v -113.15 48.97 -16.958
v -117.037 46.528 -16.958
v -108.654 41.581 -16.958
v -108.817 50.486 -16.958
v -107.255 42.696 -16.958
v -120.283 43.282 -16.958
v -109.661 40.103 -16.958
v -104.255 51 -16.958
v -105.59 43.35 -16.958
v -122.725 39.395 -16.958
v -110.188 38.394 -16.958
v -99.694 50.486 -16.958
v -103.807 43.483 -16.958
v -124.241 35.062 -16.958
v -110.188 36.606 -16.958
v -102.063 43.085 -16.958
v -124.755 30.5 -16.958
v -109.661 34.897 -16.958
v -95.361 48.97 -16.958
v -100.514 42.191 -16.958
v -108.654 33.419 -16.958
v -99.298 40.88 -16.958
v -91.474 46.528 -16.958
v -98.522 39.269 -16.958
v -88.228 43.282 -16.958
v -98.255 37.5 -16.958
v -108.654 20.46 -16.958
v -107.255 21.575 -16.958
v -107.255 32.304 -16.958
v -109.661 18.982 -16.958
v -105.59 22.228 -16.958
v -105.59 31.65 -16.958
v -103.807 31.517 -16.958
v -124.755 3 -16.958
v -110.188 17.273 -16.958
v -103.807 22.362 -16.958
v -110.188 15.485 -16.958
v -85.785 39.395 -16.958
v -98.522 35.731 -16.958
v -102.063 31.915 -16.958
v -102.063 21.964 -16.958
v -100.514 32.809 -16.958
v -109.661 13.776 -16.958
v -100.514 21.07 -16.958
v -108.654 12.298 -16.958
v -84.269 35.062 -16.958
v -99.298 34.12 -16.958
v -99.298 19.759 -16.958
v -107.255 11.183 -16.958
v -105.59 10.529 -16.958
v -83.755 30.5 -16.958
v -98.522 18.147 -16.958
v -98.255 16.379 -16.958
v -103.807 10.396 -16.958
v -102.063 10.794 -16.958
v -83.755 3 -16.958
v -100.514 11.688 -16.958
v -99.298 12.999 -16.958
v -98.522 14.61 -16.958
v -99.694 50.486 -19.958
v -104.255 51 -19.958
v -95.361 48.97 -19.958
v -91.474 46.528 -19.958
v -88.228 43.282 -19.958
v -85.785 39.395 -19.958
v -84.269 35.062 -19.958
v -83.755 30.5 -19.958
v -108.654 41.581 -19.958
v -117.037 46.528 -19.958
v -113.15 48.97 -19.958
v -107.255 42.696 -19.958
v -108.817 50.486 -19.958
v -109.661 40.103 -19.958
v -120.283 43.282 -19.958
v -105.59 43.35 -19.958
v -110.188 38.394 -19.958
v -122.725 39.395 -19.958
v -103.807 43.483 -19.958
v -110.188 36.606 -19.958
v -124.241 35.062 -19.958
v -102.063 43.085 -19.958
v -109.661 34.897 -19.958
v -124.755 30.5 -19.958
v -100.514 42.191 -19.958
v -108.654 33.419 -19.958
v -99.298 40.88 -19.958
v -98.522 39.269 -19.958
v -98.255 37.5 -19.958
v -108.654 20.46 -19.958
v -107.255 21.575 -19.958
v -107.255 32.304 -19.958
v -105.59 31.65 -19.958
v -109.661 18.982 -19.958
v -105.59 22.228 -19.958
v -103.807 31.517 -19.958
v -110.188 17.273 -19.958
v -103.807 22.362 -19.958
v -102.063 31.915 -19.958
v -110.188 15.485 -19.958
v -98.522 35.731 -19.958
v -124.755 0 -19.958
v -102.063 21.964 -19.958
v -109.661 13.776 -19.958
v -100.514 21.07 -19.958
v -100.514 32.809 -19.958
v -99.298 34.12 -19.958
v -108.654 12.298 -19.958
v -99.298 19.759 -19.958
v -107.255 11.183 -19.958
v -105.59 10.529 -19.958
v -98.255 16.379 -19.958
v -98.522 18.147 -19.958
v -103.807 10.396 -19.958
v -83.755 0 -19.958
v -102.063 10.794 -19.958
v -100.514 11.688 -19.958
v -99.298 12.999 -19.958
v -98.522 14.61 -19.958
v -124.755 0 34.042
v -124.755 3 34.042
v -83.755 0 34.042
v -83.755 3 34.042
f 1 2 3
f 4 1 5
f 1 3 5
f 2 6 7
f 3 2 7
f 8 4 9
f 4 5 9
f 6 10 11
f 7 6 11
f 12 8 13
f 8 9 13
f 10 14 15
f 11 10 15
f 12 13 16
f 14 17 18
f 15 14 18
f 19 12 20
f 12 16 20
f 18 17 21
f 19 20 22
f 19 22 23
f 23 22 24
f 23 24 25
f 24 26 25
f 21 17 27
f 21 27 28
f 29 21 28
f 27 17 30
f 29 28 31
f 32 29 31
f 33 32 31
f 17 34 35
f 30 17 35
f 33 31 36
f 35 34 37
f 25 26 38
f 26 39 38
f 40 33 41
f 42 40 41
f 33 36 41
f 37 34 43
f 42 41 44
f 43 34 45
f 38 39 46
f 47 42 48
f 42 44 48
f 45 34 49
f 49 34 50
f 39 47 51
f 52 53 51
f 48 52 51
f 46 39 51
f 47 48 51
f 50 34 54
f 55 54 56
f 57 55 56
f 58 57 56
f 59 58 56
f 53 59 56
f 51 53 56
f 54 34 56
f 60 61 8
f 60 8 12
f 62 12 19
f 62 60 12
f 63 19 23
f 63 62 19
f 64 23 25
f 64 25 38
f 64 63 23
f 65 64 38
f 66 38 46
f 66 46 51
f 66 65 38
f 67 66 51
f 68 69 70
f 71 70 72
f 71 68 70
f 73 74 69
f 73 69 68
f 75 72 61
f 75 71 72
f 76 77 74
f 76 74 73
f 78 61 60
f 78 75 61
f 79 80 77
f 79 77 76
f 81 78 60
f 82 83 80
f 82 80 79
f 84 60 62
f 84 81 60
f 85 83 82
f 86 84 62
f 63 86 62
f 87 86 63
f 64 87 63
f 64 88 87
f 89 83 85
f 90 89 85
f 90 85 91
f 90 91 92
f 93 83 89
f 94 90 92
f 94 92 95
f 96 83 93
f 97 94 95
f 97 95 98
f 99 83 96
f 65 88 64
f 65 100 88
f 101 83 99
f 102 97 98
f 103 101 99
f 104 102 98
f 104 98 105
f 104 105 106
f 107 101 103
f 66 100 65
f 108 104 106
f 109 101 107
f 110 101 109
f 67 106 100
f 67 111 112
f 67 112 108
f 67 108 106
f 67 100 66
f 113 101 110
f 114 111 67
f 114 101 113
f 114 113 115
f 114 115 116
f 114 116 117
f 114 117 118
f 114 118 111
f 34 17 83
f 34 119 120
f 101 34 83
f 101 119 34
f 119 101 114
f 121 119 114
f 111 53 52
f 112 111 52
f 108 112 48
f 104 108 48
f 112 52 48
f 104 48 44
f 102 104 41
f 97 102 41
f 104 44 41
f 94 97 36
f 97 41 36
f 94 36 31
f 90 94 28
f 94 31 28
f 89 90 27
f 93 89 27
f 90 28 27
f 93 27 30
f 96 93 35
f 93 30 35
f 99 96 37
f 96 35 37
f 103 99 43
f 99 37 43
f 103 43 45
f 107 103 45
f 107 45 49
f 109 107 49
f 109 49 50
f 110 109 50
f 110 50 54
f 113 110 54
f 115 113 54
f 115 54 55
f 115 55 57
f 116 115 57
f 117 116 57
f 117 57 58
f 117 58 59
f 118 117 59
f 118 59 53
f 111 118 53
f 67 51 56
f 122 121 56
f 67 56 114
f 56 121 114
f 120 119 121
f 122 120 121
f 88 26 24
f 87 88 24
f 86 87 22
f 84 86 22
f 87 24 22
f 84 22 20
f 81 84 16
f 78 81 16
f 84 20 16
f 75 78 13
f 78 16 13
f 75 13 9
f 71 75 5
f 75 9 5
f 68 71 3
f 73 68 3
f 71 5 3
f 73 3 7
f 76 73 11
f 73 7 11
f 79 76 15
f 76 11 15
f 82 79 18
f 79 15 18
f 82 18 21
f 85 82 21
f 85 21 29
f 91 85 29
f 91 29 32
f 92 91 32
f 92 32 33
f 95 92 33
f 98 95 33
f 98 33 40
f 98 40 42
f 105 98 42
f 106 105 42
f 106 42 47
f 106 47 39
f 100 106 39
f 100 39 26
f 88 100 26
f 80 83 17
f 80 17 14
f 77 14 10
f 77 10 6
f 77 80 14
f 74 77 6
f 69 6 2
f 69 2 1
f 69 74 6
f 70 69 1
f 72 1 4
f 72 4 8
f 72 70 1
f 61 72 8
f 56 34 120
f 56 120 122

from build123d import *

# Parameters (mm, degrees)
SKETCH1_W               = 41
SKETCH1_H               = 54
BOSS_EXTRUDE1_DEPTH     = 3
SKETCH2_W               = 41
SKETCH2_H               = 3
BOSS_EXTRUDE2_DEPTH     = 48
SKETCH4_R               = 6
CUT_EXTRUDE1_DEPTH      = 145.103724485
CUT_EXTRUDE3_DEPTH      = 145.103724485
CUT_EXTRUDE3_DEPTH_BACK = 145.103724485
SKETCH12_R              = 6
CUT_EXTRUDE4_DEPTH      = 145.103724485


with BuildPart() as part:
    # Sketch1 → Boss-Extrude1 (new body)
    with BuildSketch(Plane(origin=(0, 0, 0), x_dir=(1, 0, 0), z_dir=(0, 1, 0))):
        with Locations((-104.255294118, -7.041782531)):
            Rectangle(SKETCH1_W, SKETCH1_H)
    extrude(amount=BOSS_EXTRUDE1_DEPTH)

    # Sketch2 → Boss-Extrude2 (add)
    with BuildSketch(Plane(origin=(0, 3, 0), x_dir=(1, 0, 0), z_dir=(0, 1, 0))):
        with Locations((-104.255294118, 18.458217469)):
            Rectangle(SKETCH2_W, SKETCH2_H)
    extrude(amount=BOSS_EXTRUDE2_DEPTH)

    # Sketch4 → Cut-Extrude1 (cut, through all)
    with BuildSketch(Plane.XY.offset(-16.958217469)):
        with Locations((-104.255294118, 37.5)):
            Circle(SKETCH4_R)
    extrude(amount=-CUT_EXTRUDE1_DEPTH, mode=Mode.SUBTRACT)

    # Sketch5 → Cut-Extrude3 (cut, two sides: drawn at the far end of the back side and taken through both)
    with BuildSketch(Plane.XY.offset(-16.958217469).offset(-CUT_EXTRUDE3_DEPTH_BACK)):
        with BuildLine():
            Line((-124.755294118, 51), (-124.755294118, 30.5))
            ThreePointArc((-124.755294118, 30.5), (-118.750983132, 44.995689014), (-104.255294118, 51))
            Line((-104.255294118, 51), (-124.755294118, 51))
        make_face()
        with BuildLine():
            ThreePointArc((-104.255294118, 51), (-89.759605103, 44.995689014), (-83.755294118, 30.5))
            Line((-83.755294118, 30.5), (-83.755294118, 51))
            Line((-83.755294118, 51), (-104.255294118, 51))
        make_face()
    extrude(amount=CUT_EXTRUDE3_DEPTH + CUT_EXTRUDE3_DEPTH_BACK, mode=Mode.SUBTRACT)

    # Sketch12 → Cut-Extrude4 (cut, through all)
    with BuildSketch(Plane.XY.offset(-16.958217469)):
        with Locations((-104.255294118, 16.378845884)):
            Circle(SKETCH12_R)
    extrude(amount=-CUT_EXTRUDE4_DEPTH, mode=Mode.SUBTRACT)


solid = part.part
